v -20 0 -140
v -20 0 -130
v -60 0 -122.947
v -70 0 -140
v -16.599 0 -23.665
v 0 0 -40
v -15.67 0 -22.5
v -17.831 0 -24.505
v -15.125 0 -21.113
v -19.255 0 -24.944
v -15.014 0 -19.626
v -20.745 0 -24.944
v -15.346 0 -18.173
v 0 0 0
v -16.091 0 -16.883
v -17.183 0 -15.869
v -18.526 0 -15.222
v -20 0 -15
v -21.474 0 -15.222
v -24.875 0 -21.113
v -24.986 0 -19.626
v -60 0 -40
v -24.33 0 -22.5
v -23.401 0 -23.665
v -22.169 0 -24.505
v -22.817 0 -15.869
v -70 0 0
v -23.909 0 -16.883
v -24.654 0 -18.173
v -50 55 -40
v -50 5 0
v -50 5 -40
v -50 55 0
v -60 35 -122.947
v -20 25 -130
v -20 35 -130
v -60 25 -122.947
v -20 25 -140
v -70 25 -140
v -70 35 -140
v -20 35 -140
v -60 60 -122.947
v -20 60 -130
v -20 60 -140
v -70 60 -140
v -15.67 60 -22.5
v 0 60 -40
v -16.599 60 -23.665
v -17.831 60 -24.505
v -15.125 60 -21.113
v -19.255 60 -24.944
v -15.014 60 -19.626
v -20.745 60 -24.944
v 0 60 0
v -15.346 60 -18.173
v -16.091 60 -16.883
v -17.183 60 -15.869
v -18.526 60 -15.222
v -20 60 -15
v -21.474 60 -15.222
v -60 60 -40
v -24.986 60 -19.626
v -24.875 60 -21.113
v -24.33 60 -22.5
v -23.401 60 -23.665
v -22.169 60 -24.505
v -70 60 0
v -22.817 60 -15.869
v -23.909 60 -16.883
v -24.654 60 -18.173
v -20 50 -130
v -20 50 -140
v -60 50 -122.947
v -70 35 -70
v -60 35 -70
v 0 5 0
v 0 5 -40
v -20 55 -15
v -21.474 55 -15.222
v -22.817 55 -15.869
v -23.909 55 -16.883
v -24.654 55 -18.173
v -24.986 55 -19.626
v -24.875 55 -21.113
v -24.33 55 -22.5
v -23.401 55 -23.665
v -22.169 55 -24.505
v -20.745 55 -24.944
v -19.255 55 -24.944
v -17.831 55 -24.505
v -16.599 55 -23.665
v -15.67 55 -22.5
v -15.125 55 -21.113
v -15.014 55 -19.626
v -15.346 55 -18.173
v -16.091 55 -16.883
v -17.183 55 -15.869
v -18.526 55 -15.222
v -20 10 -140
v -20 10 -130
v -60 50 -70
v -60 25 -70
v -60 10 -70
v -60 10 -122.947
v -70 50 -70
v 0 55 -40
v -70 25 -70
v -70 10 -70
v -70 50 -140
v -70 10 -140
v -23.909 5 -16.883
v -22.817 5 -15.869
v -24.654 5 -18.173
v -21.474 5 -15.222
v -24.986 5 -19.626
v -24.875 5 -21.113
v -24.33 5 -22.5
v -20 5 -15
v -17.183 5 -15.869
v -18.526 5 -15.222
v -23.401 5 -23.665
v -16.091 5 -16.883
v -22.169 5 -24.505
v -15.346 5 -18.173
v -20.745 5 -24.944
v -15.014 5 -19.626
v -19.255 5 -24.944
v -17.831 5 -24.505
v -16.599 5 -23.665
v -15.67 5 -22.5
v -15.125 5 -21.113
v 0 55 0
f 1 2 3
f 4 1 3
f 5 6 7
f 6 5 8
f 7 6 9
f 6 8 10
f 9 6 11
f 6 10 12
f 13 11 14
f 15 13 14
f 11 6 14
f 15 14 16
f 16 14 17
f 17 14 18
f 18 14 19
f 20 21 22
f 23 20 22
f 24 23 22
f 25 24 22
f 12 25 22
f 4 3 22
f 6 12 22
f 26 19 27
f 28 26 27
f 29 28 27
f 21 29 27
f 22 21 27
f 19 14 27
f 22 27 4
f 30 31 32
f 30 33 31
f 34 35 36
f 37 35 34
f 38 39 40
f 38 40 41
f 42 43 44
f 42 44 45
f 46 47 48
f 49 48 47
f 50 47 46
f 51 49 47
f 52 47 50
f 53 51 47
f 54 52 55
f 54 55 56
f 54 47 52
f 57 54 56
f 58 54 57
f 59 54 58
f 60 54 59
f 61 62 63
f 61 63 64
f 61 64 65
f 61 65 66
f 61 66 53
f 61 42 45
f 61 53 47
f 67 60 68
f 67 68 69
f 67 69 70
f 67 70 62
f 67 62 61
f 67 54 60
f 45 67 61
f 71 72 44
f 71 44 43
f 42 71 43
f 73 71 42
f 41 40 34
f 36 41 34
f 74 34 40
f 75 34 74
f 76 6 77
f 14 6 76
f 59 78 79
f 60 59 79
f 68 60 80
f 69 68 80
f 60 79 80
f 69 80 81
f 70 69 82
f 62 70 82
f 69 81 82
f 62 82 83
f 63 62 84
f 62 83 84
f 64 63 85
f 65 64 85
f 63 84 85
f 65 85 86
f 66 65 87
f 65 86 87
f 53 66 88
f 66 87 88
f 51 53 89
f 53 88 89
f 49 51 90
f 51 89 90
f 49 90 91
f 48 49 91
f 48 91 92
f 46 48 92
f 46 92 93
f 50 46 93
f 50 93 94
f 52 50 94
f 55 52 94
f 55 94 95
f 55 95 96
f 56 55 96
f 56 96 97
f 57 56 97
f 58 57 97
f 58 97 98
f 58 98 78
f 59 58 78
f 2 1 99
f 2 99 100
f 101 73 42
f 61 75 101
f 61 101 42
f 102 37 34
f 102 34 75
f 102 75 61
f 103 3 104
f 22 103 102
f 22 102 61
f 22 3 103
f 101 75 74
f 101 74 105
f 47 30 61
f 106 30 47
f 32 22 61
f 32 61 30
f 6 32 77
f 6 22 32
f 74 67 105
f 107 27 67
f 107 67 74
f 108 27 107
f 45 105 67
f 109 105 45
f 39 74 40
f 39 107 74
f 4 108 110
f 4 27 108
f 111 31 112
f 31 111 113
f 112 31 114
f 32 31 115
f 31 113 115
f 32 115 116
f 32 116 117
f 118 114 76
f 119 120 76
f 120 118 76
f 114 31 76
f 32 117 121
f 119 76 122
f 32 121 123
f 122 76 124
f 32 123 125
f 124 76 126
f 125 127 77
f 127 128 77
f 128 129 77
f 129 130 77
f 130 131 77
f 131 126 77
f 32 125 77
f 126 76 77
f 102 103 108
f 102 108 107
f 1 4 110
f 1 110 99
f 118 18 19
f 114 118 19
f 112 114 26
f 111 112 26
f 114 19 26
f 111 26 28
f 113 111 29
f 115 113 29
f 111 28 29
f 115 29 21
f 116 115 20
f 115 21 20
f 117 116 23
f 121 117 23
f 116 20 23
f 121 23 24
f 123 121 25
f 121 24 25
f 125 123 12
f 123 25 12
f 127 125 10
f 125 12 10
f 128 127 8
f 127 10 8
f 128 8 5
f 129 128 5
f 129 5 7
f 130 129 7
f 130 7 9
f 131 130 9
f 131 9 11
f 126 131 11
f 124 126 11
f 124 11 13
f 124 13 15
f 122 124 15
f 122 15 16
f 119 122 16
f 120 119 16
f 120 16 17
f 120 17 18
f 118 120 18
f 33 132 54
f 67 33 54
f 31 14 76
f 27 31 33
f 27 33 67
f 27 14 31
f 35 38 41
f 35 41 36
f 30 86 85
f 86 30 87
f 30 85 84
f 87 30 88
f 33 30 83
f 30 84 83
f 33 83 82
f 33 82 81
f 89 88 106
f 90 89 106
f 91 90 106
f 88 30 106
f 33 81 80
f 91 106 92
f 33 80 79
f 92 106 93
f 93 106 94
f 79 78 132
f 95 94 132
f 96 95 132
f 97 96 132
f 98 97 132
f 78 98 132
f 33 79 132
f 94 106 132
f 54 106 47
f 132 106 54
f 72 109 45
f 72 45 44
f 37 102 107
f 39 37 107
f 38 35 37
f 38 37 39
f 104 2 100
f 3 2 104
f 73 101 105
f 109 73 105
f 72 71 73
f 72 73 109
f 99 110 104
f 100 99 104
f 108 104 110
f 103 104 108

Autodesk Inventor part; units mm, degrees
ref_plane "YZ Plane" through (0, 0, 0) normal (1, 0, 0) x (0, 1, 0)
ref_plane "XZ Plane" through (0, 0, 0) normal (0, 1, 0) x (-1, 0, 0)
ref_plane "XY Plane" through (0, 0, 0) normal (0, 0, 1) x (1, 0, 0)
sketch "스케치1" plane through (0, 0, 0) normal (0, 1, 0) x (-1, 0, 0)
  line L0 (0, 0) -> (70, 0)
  line L1 (70, 0) -> (70, -140)
  line L2 (70, -140) -> (20, -140)
  line L3 (20, -140) -> (20, -130)
  line L4 (20, -130) -> (60, -122.9469)
  line L5 (60, -122.9469) -> (60, -40)
  line L6 (60, -40) -> (0, -40)
  line L7 (0, -40) -> (0, 0)
  dimension "d0" = 60
  dimension "d1" = 40
  dimension "d2" = 140
  dimension "d3" = 50
  dimension "d4" = 100
  dimension "d5" = 10
  dimension "d6" = 70
extrude "돌출1" add sketch "스케치1" along normal blind 60
sketch "스케치2" plane through (0, 0, 0) normal (1, 0, 0) x (0, 0, -1)
  line L0 (40, 0) -> (0, 0) projected
  line L1 (40, 0) -> (40, 60) projected
  line L2 (0, 60) -> (40, 60) projected
  line L3 (0, 0) -> (0, 60) projected
  line L4 (40, 0) -> (40, 60) projected
  line L5 (0, 5) -> (40, 5)
  line L6 (40, 5) -> (40, 55)
  line L7 (40, 55) -> (0, 55)
  line L8 (0, 55) -> (0, 5)
  dimension "d9" = 5
  dimension "d10" = 5
extrude "돌출2" cut sketch "스케치2" against normal blind 50 contours L5 L3 L7 L1
sketch "스케치3" plane through (-20, 0, -130) normal (1, 0, 0) x (0, 0, -1)
  line L0 (10, 0) -> (0, 0) projected
  line L1 (10, 0) -> (10, 60) projected
  line L2 (0, 60) -> (10, 60) projected
  line L3 (0, 0) -> (0, 60) projected
  line L4 (10, 35) -> (-60, 35)
  line L5 (-60, 35) -> (-60, 50)
  line L6 (-60, 50) -> (10, 50)
  line L7 (10, 50) -> (10, 35)
  line L8 (10, 0) -> (10, 60) projected
  line L9 (10, 10) -> (-60, 10)
  line L10 (-60, 10) -> (-60, 25)
  line L11 (-60, 25) -> (10, 25)
  line L12 (10, 25) -> (10, 10)
  line L13 (-90, 60) -> (-7.0531, 60) projected
  line L14 (-7.0531, 0) -> (-90, 0) projected
  point P0 (-130, 0)
  dimension "d13" = 70
  dimension "d14" = 15
  dimension "d15" = 70
  dimension "d16" = 15
  dimension "d17" = 10
  dimension "d18" = 10
extrude "돌출3" cut sketch "스케치3" against normal blind 50 contours L9 L3 L11 L1 | L9 L10 L11 L3 | L4 L3 L6 L1 | L4 L5 L6 L3
sketch "스케치4" plane through (0, 60, 0) normal (0, 1, 0) x (1, 0, 0)
  line L0 (-70, 0) -> (0, 0) projected
  line L1 (0, 0) -> (0, 40) projected
  point P0 (-20, 20)
  dimension "d21" = 20
  dimension "d22" = 20
hole "구멍1" at (-20, 60, -20) direction (0, -1, 0) diameter 10 end through all
properties part number "claw"
